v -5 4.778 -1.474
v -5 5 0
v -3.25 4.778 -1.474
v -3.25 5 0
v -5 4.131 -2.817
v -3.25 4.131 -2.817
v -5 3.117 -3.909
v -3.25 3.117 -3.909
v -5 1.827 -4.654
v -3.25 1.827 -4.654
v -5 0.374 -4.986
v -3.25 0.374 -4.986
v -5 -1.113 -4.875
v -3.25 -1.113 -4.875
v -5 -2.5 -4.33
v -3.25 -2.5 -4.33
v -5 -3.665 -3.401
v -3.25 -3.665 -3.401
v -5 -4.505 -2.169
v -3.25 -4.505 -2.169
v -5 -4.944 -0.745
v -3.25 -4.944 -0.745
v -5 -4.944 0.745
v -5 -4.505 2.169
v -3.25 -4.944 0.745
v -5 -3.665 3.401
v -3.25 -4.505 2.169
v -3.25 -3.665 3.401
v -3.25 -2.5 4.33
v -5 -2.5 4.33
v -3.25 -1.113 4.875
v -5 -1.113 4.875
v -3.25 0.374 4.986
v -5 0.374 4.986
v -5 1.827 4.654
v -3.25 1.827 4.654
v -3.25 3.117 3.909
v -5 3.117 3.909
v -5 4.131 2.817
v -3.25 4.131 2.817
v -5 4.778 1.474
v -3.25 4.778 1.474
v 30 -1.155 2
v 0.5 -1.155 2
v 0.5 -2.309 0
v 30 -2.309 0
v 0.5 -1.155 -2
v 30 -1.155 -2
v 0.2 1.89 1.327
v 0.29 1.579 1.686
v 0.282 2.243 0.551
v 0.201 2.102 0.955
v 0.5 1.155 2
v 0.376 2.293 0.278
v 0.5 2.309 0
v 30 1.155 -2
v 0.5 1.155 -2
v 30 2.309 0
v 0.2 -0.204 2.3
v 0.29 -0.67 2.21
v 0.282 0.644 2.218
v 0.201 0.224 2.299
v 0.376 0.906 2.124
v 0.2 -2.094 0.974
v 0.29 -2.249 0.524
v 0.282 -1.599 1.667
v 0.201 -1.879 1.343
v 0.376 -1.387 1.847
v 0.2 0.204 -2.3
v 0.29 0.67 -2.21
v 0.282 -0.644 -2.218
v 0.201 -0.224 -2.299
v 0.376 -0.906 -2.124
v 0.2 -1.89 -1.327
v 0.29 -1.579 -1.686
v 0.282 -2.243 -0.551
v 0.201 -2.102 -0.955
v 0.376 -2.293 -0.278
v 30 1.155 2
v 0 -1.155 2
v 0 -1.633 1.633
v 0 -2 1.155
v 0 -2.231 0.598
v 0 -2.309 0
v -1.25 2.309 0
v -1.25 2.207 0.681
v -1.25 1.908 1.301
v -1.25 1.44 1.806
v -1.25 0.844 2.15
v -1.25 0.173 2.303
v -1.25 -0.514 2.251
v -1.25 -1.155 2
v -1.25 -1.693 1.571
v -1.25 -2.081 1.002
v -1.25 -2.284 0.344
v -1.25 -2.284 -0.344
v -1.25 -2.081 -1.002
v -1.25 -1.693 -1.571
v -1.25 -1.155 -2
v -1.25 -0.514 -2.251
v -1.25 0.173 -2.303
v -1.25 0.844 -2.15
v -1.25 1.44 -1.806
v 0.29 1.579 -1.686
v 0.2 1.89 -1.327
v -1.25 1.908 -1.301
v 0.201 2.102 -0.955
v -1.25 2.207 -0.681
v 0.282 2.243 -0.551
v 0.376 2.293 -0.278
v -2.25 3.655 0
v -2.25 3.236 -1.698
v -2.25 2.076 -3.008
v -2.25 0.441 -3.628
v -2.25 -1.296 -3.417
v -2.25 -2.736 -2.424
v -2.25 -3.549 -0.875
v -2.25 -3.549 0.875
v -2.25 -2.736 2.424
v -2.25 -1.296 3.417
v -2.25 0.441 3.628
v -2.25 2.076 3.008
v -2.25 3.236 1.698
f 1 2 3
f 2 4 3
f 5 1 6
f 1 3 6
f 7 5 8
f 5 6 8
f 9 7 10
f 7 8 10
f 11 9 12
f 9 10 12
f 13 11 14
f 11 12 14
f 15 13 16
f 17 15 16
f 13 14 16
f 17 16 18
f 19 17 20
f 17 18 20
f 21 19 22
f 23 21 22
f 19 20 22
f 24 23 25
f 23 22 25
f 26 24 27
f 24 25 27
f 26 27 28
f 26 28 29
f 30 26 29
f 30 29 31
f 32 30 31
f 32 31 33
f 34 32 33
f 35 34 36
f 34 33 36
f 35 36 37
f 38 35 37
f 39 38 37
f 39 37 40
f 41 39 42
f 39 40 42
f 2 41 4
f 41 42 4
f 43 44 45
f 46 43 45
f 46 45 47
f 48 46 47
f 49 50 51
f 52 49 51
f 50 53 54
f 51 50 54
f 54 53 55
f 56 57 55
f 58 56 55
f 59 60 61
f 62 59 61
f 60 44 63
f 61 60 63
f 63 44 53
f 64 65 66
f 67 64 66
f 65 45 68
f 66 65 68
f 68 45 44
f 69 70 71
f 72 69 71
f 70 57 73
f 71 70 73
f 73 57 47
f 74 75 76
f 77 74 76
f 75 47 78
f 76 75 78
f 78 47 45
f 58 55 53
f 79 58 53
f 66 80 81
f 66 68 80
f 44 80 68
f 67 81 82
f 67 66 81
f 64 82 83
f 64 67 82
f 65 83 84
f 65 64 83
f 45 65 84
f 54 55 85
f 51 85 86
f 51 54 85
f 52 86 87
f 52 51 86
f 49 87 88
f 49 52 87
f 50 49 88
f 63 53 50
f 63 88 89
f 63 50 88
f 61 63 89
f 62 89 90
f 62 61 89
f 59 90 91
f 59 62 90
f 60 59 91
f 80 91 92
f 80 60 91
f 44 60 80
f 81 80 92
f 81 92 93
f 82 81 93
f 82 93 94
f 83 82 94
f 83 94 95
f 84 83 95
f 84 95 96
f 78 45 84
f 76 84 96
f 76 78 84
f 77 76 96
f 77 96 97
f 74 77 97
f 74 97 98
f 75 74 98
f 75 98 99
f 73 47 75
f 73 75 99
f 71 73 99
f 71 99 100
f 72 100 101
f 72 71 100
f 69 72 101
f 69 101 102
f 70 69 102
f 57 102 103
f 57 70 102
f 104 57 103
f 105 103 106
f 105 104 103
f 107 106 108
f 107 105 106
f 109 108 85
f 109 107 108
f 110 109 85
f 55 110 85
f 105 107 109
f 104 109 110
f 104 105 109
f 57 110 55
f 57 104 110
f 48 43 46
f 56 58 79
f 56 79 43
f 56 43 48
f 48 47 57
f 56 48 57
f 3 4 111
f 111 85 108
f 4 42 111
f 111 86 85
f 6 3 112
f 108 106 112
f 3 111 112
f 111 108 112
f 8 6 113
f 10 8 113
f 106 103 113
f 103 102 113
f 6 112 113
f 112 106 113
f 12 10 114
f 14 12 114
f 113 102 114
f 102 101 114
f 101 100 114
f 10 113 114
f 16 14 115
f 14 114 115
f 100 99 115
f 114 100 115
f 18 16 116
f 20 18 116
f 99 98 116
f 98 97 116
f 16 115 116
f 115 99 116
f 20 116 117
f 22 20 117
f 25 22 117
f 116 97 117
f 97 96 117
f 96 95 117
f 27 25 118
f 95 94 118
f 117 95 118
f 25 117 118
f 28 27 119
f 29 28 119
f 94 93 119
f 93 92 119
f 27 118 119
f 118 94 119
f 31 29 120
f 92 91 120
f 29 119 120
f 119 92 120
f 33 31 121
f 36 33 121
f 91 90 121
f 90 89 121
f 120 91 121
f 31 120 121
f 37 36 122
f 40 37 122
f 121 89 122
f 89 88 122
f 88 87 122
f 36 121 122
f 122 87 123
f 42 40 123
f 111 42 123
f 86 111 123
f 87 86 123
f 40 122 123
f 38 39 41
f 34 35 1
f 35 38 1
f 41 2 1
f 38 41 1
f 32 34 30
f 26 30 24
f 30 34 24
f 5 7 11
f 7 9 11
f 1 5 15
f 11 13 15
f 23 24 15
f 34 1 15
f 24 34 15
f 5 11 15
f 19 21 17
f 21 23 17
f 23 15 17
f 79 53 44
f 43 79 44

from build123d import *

# Parameters (mm, degrees)
BOSS_EXTRUDE1_DEPTH = 30
CHAMFER1_SIZE       = 0.5
CHAMFER2_SIZE       = 0.5
CHAMFER3_SIZE       = 0.5


with BuildPart() as part:
    # Sketch1 → Boss-Extrude1 (new body)
    with BuildSketch(Plane(origin=(0, 0, 0), x_dir=(0, 0, -1), z_dir=(1, 0, 0))):
        Polygon((0, 2.309401077), (-2, 1.154700538), (-2, -1.154700538), (0, -2.309401077), (2, -1.154700538), (2, 1.154700538), align=None)
    extrude(amount=BOSS_EXTRUDE1_DEPTH)

    # Sketch4 → Revolve4 (revolve)
    with BuildSketch(Plane.XY):
        Polygon((0, 0), (-5, 0), (-5, 5), (-3.25, 5), (-1.25, 2.309401077), (0, 2.309401077), align=None)
    revolve(axis=Axis((0, 0, 0), (-1, 0, 0)))

    # Chamfer1
    # the kernel refuses this chamfer: 0.5 mm, written as the material it adds along each edge
    with BuildSketch(Plane(origin=(0, -2.952321824, 1.113571399), x_dir=(0.9996219169112968, 0.02381212764409037, 0.013747938305293311), z_dir=(0, 0.5000000000000001, -0.8660254037844386))) as chamfer1_piece_1_section:
        Polygon((CHAMFER1_SIZE * 0.999621916911, CHAMFER1_SIZE * 0.0274958766106), (-CHAMFER1_SIZE * 0.0274958766106, CHAMFER1_SIZE * 0.999621916911), (0, 0), align=None)
    chamfer1_piece_1 = extrude(amount=4.881084065, mode=Mode.PRIVATE)
    chamfer1_piece_1 = split(chamfer1_piece_1, bisect_by=Plane(origin=(0.199770768, -1.81784162, -2), z_dir=(0, 0, 1)), keep=Keep.TOP, mode=Mode.PRIVATE)
    chamfer1_piece_1 = split(chamfer1_piece_1, bisect_by=Plane(origin=(0.199770768, -2.640971617, -0.574297023), z_dir=(0, 0.8660254037844387, -0.49999999999999983)), keep=Keep.TOP, mode=Mode.PRIVATE)
    chamfer1_piece_1 = chamfer1_piece_1 & Plane(origin=(0.199770768, 0, 0), x_dir=(0, 1, 0), z_dir=(1, 0, 0)) * Cylinder(2.309401077, 12, mode=Mode.PRIVATE)
    add(chamfer1_piece_1)
    with BuildSketch(Plane(origin=(0, 2.952321824, -1.113571399), x_dir=(0.9996219169112968, -0.023812127644089905, -0.013747938305293039), z_dir=(0, -0.5000000000000001, 0.8660254037844387))) as chamfer1_piece_2_section:
        Polygon((CHAMFER1_SIZE * 0.999621916911, CHAMFER1_SIZE * 0.0274958766106), (-CHAMFER1_SIZE * 0.0274958766106, CHAMFER1_SIZE * 0.999621916911), (0, 0), align=None)
    chamfer1_piece_2 = extrude(amount=4.881084065, mode=Mode.PRIVATE)
    chamfer1_piece_2 = split(chamfer1_piece_2, bisect_by=Plane(origin=(0.19977077, 2.640971618, 0.574297023), z_dir=(0, -0.8660254037844388, 0.49999999999999983)), keep=Keep.TOP, mode=Mode.PRIVATE)
    chamfer1_piece_2 = split(chamfer1_piece_2, bisect_by=Plane(origin=(0.19977077, 1.817841619, 2), z_dir=(0, 0, -1)), keep=Keep.TOP, mode=Mode.PRIVATE)
    chamfer1_piece_2 = chamfer1_piece_2 & Plane(origin=(0.19977077, 0, 0), x_dir=(0, 1, 0), z_dir=(1, 0, 0)) * Cylinder(2.309401077, 12, mode=Mode.PRIVATE)
    add(chamfer1_piece_2)

    # Chamfer2
    # the kernel refuses this chamfer: 0.5 mm, written as the material it adds along each edge
    with BuildSketch(Plane(origin=(0, -2.440542032, -2), x_dir=(0.9996219169112968, 0, 0.027495876610586494), z_dir=(0, 1, 0))) as chamfer2_piece_1_section:
        Polygon((CHAMFER2_SIZE * 0.999621916911, CHAMFER2_SIZE * 0.0274958766106), (-CHAMFER2_SIZE * 0.0274958766106, CHAMFER2_SIZE * 0.999621916911), (0, 0), align=None)
    chamfer2_piece_1 = extrude(amount=4.881084065, mode=Mode.PRIVATE)
    chamfer2_piece_1 = chamfer2_piece_1 & Plane(origin=(0.352657497, 0, 0), x_dir=(0, 1, 0), z_dir=(1, 0, 0)) * Cylinder(2.309401077, 12, mode=Mode.PRIVATE)
    chamfer2_piece_1 = split(chamfer2_piece_1, bisect_by=Plane(origin=(0.352657497, 0.578909499, -2.997299335), z_dir=(0, -0.8660254037844388, 0.49999999999999983)), keep=Keep.TOP, mode=Mode.PRIVATE)
    add(chamfer2_piece_1)
    with BuildSketch(Plane(origin=(0, 2.440542032, 2), x_dir=(0.9996219169112968, 0, -0.027495876610586494), z_dir=(0, -1, 0))) as chamfer2_piece_2_section:
        Polygon((CHAMFER2_SIZE * 0.999621916911, CHAMFER2_SIZE * 0.0274958766106), (-CHAMFER2_SIZE * 0.0274958766106, CHAMFER2_SIZE * 0.999621916911), (0, 0), align=None)
    chamfer2_piece_2 = extrude(amount=4.881084065, mode=Mode.PRIVATE)
    chamfer2_piece_2 = chamfer2_piece_2 & Plane(origin=(0.352657497, 0, 0), x_dir=(0, 1, 0), z_dir=(1, 0, 0)) * Cylinder(2.309401077, 12, mode=Mode.PRIVATE)
    chamfer2_piece_2 = split(chamfer2_piece_2, bisect_by=Plane(origin=(0.352657497, -0.578909499, 2.997299335), z_dir=(0, 0.8660254037844387, -0.49999999999999983)), keep=Keep.TOP, mode=Mode.PRIVATE)
    add(chamfer2_piece_2)

    # Chamfer3
    # the kernel refuses this chamfer: 0.5 mm, written as the material it adds along each edge
    with BuildSketch(Plane(origin=(0, 0.511779791, -3.113571399), x_dir=(-0.027495876610586466, 0.8656979742248804, -0.49981095845564816), z_dir=(0, 0.49999999999999983, 0.8660254037844388))) as chamfer3_piece_1_section:
        Polygon((CHAMFER3_SIZE * 0.999621916911, -CHAMFER3_SIZE * 0.0274958766106), (-CHAMFER3_SIZE * 0.0274958766106, -CHAMFER3_SIZE * 0.999621916911), (0, 0), align=None)
    chamfer3_piece_1 = extrude(amount=4.881084065, mode=Mode.PRIVATE)
    chamfer3_piece_1 = chamfer3_piece_1 & Plane(origin=(0.352657492, 0, 0), x_dir=(0, 1, 0), z_dir=(1, 0, 0)) * Cylinder(2.309401077, 12, mode=Mode.PRIVATE)
    add(chamfer3_piece_1)
    with BuildSketch(Plane(origin=(0, -0.511779791, 3.113571399), x_dir=(0.9996219169112968, 0.023812127644090055, -0.013747938305293115), z_dir=(0, -0.4999999999999999, -0.8660254037844388))) as chamfer3_piece_2_section:
        Polygon((CHAMFER3_SIZE * 0.999621916911, CHAMFER3_SIZE * 0.0274958766106), (-CHAMFER3_SIZE * 0.0274958766106, CHAMFER3_SIZE * 0.999621916911), (0, 0), align=None)
    chamfer3_piece_2 = extrude(amount=4.881084065, mode=Mode.PRIVATE)
    chamfer3_piece_2 = chamfer3_piece_2 & Plane(origin=(0.352657501, 0, 0), x_dir=(0, 1, 0), z_dir=(1, 0, 0)) * Cylinder(2.309401077, 12, mode=Mode.PRIVATE)
    add(chamfer3_piece_2)


solid = part.part
